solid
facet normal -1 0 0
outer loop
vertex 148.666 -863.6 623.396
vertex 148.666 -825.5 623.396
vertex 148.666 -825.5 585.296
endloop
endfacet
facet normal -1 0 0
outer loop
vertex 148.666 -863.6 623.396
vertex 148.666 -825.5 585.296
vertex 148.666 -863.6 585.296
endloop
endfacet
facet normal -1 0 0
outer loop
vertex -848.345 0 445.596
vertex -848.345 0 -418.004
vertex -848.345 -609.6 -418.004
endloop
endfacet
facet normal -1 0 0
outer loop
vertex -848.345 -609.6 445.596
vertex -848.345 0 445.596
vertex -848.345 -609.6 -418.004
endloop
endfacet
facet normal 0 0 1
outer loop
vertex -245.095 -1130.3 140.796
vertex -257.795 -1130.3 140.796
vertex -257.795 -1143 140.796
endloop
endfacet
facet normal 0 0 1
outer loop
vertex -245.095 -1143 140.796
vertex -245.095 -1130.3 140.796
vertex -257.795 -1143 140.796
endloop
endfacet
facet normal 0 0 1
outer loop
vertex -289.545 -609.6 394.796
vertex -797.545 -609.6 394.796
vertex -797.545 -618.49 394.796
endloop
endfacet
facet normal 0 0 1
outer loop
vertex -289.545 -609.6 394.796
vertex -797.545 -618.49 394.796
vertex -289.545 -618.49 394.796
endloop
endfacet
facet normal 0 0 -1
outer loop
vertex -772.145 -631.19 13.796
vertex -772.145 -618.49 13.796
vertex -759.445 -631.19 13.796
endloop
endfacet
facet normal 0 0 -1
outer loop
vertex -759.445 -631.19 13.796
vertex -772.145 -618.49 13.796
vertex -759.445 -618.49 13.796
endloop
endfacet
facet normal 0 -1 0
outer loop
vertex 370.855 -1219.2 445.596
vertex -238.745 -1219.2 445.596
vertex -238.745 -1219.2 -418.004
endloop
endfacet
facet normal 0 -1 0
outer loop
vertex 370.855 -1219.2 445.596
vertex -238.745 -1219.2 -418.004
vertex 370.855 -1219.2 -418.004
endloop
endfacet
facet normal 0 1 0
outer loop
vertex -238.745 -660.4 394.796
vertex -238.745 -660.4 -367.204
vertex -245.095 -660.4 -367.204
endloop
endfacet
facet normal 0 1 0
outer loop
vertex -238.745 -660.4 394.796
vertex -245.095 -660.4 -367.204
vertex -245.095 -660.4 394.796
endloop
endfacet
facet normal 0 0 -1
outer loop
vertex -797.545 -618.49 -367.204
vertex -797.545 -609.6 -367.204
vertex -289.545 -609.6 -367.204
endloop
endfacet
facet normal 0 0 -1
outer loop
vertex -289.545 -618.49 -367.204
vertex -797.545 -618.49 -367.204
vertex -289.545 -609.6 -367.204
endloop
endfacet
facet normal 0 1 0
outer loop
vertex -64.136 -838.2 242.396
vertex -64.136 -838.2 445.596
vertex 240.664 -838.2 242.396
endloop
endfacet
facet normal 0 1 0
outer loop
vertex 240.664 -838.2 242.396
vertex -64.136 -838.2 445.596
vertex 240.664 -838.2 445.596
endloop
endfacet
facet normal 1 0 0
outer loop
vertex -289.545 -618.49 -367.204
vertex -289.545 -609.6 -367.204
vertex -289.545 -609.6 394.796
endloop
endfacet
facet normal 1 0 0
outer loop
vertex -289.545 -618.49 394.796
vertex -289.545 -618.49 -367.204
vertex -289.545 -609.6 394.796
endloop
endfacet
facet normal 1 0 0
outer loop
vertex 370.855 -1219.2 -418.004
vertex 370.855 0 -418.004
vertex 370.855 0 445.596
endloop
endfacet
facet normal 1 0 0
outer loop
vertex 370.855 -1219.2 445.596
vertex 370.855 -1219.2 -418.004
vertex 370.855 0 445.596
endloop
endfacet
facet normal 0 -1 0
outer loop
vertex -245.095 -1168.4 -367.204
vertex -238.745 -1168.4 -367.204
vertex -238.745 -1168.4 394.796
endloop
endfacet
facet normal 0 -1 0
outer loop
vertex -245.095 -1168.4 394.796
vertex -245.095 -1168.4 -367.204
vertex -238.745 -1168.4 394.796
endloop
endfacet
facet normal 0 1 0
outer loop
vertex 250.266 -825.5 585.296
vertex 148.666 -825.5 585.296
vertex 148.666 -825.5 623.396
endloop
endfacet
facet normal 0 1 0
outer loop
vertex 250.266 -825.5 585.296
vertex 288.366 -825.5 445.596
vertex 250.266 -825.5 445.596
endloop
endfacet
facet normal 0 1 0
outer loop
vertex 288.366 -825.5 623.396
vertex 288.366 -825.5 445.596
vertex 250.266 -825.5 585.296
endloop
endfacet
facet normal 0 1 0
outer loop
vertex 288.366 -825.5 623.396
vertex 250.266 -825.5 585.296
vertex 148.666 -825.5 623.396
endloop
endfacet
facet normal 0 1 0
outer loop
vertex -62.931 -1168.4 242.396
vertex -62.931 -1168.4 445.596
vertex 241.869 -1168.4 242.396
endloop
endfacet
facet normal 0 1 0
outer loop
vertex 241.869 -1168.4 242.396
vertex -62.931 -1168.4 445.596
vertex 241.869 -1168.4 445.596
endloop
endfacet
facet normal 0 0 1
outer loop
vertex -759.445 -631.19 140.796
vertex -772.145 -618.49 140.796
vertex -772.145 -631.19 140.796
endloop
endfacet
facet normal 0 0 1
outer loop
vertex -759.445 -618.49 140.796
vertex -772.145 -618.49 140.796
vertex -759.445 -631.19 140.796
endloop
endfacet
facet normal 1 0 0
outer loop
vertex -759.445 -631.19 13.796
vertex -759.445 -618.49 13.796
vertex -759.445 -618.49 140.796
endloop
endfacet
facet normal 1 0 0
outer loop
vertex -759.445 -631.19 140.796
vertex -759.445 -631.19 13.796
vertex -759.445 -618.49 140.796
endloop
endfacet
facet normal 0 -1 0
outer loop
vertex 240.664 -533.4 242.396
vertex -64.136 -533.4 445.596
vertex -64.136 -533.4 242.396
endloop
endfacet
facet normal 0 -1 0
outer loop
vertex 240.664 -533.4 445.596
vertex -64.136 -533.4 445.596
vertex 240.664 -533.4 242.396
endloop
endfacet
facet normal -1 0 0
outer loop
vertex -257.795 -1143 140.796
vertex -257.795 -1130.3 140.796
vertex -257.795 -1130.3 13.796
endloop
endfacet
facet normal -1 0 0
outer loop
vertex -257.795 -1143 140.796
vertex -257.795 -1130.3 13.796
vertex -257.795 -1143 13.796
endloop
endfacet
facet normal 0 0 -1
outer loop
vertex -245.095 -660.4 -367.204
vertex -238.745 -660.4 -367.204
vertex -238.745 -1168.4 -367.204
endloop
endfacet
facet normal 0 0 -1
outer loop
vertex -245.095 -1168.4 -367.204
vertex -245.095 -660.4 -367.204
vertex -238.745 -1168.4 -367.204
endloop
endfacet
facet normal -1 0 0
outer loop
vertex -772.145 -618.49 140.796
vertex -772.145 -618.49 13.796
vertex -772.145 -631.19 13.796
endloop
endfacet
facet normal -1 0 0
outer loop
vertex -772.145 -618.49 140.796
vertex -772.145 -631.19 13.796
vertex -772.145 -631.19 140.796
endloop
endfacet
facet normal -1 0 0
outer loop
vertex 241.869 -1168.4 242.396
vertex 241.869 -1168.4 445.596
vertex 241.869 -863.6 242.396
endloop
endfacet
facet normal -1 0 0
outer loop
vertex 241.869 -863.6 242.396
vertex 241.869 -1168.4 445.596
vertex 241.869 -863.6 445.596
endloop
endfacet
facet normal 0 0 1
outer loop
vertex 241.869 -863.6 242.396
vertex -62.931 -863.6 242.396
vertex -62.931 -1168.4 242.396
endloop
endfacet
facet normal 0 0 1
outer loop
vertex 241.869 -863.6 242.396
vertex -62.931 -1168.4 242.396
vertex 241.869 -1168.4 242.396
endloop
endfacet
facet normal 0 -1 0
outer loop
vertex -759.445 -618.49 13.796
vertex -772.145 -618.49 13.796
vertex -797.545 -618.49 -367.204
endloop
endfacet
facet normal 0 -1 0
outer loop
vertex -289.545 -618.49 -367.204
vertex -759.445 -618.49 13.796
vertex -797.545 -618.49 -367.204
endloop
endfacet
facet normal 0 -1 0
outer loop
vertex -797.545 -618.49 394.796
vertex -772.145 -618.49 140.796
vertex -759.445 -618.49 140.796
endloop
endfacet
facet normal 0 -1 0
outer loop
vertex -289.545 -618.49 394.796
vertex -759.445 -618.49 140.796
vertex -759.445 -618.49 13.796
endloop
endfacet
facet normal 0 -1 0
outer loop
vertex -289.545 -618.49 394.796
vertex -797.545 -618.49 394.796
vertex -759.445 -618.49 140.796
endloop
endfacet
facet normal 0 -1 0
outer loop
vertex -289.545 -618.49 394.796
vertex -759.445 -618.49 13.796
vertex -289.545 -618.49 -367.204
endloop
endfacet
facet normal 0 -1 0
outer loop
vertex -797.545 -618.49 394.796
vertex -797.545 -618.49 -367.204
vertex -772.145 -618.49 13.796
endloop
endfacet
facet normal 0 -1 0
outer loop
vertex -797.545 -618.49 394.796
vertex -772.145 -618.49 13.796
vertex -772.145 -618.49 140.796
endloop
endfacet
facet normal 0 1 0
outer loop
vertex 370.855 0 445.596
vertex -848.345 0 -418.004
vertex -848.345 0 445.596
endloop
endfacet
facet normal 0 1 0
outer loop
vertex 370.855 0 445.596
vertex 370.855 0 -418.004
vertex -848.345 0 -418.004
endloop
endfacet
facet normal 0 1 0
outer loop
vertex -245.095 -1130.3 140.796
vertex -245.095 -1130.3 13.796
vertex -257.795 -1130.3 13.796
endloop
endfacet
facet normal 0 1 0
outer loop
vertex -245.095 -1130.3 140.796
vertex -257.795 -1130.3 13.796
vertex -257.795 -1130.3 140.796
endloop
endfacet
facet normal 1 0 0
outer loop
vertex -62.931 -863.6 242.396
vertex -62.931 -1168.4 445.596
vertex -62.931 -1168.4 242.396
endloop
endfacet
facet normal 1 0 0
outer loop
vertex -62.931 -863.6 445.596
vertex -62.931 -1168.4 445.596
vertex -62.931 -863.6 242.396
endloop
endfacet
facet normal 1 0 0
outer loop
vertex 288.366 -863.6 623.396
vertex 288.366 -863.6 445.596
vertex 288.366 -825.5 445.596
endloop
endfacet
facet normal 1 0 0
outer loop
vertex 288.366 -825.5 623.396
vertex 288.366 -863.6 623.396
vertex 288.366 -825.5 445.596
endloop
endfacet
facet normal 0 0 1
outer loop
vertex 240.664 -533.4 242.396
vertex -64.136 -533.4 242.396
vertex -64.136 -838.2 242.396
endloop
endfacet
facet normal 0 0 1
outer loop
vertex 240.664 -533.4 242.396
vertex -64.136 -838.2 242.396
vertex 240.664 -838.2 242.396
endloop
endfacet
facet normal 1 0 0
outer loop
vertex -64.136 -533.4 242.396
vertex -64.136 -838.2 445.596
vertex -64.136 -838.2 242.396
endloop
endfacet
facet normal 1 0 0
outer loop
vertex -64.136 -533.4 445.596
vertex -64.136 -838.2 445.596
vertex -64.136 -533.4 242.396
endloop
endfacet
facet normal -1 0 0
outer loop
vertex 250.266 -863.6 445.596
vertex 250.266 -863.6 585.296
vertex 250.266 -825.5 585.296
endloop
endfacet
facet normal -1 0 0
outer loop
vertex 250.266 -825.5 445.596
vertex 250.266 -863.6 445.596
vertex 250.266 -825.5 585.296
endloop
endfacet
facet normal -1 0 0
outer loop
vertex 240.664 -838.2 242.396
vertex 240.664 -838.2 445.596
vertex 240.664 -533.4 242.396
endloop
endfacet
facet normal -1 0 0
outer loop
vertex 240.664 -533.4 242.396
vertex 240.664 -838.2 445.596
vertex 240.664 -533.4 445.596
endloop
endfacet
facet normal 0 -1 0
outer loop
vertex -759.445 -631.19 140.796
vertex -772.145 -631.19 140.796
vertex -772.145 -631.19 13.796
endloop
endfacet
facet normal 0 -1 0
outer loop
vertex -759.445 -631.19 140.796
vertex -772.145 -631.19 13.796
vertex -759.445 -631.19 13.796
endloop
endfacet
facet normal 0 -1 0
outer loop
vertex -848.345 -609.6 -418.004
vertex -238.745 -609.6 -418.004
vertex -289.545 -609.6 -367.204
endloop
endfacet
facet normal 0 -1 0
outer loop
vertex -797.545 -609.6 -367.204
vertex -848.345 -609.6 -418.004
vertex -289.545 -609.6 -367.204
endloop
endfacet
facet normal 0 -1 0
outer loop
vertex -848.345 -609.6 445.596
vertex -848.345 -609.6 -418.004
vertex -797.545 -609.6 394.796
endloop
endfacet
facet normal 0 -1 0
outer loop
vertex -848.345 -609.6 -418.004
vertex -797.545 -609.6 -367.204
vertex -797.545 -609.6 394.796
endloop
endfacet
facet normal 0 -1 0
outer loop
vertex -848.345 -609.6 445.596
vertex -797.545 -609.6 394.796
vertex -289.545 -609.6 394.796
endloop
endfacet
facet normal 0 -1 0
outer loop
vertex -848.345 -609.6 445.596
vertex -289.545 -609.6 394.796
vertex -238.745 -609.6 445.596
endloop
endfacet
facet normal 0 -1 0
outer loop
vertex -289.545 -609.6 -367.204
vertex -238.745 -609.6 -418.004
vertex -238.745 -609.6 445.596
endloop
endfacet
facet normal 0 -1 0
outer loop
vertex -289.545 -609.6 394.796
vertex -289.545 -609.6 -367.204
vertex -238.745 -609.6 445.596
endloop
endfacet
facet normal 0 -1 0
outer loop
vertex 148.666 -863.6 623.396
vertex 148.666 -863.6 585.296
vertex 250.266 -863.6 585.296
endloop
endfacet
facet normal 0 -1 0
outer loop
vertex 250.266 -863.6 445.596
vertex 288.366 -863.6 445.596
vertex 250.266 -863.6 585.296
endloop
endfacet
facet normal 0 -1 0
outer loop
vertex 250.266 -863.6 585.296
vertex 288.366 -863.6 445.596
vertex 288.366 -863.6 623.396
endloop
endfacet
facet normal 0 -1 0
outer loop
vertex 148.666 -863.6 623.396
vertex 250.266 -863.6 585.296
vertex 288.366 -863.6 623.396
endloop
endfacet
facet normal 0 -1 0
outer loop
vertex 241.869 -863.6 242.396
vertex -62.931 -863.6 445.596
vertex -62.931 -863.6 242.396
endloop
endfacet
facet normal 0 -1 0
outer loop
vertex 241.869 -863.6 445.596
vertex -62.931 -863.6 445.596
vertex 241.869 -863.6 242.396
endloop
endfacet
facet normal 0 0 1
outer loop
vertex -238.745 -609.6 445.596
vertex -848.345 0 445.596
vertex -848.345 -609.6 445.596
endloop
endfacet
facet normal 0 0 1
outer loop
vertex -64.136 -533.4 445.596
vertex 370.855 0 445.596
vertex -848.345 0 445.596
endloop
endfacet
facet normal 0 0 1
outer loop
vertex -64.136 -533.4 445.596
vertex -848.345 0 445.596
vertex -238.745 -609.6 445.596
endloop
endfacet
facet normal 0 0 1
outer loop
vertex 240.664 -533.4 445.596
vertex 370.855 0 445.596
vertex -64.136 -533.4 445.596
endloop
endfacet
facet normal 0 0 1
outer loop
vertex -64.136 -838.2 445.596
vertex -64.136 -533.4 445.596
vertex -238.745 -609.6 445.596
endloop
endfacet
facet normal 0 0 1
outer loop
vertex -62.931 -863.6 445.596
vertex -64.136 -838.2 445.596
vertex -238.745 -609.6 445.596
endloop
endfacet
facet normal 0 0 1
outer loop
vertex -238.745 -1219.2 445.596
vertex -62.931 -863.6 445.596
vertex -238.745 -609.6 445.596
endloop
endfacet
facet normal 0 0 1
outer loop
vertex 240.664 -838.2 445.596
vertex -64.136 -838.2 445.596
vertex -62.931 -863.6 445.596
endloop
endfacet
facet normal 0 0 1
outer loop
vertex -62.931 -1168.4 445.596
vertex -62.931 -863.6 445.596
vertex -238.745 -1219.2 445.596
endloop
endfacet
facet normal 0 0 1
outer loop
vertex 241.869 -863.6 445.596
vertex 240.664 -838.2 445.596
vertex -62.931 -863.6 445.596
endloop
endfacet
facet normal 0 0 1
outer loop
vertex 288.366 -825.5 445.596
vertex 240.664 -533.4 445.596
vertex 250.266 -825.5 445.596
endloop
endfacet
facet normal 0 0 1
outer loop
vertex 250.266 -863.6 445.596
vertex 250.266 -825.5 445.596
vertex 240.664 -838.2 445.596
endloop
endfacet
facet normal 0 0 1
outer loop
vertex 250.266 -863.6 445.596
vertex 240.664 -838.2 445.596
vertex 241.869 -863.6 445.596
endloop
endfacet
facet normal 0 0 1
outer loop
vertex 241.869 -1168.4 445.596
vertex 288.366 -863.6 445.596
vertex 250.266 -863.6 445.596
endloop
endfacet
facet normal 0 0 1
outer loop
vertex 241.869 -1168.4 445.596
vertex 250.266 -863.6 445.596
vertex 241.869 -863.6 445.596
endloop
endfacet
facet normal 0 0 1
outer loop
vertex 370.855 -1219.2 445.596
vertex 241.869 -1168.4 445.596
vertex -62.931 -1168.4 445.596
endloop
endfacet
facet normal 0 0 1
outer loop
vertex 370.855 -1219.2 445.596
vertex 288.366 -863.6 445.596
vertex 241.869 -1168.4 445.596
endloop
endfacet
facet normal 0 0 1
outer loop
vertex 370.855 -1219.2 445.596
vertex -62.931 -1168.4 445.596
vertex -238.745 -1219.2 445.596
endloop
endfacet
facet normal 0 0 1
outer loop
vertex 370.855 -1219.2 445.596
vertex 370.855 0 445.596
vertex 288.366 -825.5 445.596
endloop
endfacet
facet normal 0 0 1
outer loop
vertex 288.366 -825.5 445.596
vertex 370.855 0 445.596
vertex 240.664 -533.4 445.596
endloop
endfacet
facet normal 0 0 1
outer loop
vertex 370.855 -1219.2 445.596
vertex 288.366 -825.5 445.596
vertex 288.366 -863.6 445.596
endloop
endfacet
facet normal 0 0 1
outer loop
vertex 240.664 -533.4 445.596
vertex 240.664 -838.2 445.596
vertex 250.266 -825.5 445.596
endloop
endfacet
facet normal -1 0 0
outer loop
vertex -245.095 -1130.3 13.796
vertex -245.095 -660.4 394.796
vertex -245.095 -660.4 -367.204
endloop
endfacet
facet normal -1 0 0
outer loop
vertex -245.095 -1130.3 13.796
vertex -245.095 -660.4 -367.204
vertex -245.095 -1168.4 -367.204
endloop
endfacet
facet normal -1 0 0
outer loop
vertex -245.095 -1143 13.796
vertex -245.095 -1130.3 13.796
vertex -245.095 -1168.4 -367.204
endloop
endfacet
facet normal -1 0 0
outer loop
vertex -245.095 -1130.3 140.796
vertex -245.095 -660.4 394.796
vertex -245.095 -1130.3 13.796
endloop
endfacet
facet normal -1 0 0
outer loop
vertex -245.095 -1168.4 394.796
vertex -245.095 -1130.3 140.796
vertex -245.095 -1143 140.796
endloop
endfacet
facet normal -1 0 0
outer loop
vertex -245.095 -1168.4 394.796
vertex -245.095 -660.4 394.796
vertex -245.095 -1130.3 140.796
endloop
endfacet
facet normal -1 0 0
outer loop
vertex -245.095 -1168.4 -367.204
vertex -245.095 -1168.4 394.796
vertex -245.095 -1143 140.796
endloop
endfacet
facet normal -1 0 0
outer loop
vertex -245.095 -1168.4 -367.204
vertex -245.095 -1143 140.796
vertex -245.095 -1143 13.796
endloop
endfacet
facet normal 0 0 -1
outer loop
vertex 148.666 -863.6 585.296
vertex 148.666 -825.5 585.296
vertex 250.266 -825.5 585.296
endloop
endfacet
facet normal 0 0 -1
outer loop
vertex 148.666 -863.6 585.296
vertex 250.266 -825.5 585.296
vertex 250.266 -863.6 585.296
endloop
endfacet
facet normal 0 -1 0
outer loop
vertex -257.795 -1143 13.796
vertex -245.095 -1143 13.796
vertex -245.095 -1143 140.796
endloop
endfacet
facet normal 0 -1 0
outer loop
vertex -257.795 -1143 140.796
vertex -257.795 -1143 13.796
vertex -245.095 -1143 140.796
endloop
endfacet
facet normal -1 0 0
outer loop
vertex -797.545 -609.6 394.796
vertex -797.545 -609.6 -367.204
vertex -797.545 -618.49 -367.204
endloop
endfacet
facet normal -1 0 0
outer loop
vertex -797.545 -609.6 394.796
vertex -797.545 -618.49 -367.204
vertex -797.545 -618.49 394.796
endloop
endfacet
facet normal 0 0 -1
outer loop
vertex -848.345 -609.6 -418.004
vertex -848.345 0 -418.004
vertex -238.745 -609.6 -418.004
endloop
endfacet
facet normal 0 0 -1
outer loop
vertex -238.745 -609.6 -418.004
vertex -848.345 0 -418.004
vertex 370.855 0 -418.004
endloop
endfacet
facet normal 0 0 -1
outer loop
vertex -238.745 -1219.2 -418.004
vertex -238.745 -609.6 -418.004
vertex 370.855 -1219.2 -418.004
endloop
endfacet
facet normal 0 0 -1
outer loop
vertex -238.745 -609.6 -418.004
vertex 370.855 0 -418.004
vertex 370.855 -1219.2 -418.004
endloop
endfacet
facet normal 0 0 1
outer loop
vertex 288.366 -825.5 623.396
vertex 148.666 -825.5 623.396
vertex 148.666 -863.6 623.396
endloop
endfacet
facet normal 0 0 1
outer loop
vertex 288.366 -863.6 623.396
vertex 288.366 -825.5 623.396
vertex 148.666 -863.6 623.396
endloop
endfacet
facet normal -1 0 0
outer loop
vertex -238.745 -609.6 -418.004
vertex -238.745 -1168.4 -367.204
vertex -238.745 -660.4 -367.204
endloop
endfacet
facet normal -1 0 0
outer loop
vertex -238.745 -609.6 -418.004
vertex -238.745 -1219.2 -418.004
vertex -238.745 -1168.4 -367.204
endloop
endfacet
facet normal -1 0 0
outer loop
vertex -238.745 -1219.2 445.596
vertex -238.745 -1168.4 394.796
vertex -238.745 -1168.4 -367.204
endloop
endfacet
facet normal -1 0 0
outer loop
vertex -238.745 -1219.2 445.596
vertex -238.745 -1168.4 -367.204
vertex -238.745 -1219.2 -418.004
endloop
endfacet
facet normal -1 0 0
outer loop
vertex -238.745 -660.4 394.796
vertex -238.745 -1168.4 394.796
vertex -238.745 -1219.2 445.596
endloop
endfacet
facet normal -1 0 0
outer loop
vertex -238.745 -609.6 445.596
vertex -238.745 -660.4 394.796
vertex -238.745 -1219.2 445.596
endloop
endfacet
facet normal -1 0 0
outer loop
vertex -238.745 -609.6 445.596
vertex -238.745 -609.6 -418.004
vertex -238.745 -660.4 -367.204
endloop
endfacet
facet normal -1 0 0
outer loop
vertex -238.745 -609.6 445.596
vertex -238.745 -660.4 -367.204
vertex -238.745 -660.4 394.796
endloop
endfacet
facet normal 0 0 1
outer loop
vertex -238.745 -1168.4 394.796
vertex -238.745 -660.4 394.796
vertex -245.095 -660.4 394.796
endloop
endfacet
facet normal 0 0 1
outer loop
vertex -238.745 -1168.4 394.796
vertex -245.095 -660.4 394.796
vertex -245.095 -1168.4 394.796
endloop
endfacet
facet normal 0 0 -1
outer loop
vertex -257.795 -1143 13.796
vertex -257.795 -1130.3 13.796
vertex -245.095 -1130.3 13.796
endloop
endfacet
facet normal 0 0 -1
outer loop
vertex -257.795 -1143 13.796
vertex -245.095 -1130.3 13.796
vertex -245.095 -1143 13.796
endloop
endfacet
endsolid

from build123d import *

# Parameters (mm, degrees)
F0_W      = 609.6
F0_H      = 863.6
F1_DEPTH  = 1219.2
F2_W      = 609.6
F2_H      = 863.6
F3_DEPTH  = 609.6
F4_W      = 508
F4_H      = 762
F5_DEPTH  = 6.35
F6_W      = 508
F6_H      = 762
F7_DEPTH  = 8.89
F8_W      = 12.7
F8_H      = 127
F9_DEPTH  = 12.7
F10_W     = 12.7
F10_H     = 127
F11_DEPTH = 12.7
F12_W     = 304.8
F12_H     = 304.8
F13_DEPTH = 203.2
F14_W     = 38.1
F14_H     = 38.1
F15_DEPTH = 177.8
F16_W     = 38.1
F16_H     = 38.1
F17_DEPTH = 101.6


with BuildPart() as f1:
    # F0 (on Front) → F1 (new body)
    with BuildSketch(Plane.XZ):
        with Locations((66.055058, 13.796019)):
            Rectangle(F0_W, F0_H)
    extrude(amount=F1_DEPTH)

    # F2 (on face) → F3 (join)
    with BuildSketch(Plane(origin=(-238.744942, 0, 0), x_dir=(0, -1, 0), z_dir=(-1, 0, 0))):
        with Locations((304.8, 13.796019)):
            Rectangle(F2_W, F2_H)
    extrude(amount=F3_DEPTH)

    # F4 (on face) → F5 (join)
    with BuildSketch(Plane(origin=(-238.744942, 0, 0), x_dir=(0, -1, 0), z_dir=(-1, 0, 0))):
        with Locations((914.4, 13.796019)):
            Rectangle(F4_W, F4_H)
    extrude(amount=F5_DEPTH)

    # F6 (on face) → F7 (join)
    with BuildSketch(Plane.XZ.offset(609.6)):
        with Locations((-543.544942, 13.796019)):
            Rectangle(F6_W, F6_H)
    extrude(amount=F7_DEPTH)

    # F8 (on face) → F9 (join)
    with BuildSketch(Plane.XZ.offset(618.49)):
        with Locations((-765.794942, 77.296019)):
            Rectangle(F8_W, F8_H)
    extrude(amount=F9_DEPTH)

    # F10 (on face) → F11 (join)
    with BuildSketch(Plane(origin=(-245.094942, 0, 0), x_dir=(0, -1, 0), z_dir=(-1, 0, 0))):
        with Locations((1136.65, 77.296019)):
            Rectangle(F10_W, F10_H)
    extrude(amount=F11_DEPTH)

    # F12 (on face) → F13 (cut)
    with BuildSketch(Plane.XY.offset(445.596019)):
        with Locations((88.263965, -685.8)):
            Rectangle(F12_W, F12_H)
        with Locations((89.468716, -1016)):
            Rectangle(F12_W, F12_H)
    extrude(amount=-F13_DEPTH, mode=Mode.SUBTRACT)

    # F14 (on face) → F15 (join)
    with BuildSketch(Plane.XY.offset(445.596019)):
        with Locations((269.315895, -844.55)):
            Rectangle(F14_W, F14_H)
    extrude(amount=F15_DEPTH)

    # F16 (on face) → F17 (join)
    with BuildSketch(Plane(origin=(250.265895, 0, 0), x_dir=(0, -1, 0), z_dir=(-1, 0, 0))):
        with Locations((844.55, 604.346019)):
            Rectangle(F16_W, F16_H)
    extrude(amount=F17_DEPTH)


solid = f1.part
